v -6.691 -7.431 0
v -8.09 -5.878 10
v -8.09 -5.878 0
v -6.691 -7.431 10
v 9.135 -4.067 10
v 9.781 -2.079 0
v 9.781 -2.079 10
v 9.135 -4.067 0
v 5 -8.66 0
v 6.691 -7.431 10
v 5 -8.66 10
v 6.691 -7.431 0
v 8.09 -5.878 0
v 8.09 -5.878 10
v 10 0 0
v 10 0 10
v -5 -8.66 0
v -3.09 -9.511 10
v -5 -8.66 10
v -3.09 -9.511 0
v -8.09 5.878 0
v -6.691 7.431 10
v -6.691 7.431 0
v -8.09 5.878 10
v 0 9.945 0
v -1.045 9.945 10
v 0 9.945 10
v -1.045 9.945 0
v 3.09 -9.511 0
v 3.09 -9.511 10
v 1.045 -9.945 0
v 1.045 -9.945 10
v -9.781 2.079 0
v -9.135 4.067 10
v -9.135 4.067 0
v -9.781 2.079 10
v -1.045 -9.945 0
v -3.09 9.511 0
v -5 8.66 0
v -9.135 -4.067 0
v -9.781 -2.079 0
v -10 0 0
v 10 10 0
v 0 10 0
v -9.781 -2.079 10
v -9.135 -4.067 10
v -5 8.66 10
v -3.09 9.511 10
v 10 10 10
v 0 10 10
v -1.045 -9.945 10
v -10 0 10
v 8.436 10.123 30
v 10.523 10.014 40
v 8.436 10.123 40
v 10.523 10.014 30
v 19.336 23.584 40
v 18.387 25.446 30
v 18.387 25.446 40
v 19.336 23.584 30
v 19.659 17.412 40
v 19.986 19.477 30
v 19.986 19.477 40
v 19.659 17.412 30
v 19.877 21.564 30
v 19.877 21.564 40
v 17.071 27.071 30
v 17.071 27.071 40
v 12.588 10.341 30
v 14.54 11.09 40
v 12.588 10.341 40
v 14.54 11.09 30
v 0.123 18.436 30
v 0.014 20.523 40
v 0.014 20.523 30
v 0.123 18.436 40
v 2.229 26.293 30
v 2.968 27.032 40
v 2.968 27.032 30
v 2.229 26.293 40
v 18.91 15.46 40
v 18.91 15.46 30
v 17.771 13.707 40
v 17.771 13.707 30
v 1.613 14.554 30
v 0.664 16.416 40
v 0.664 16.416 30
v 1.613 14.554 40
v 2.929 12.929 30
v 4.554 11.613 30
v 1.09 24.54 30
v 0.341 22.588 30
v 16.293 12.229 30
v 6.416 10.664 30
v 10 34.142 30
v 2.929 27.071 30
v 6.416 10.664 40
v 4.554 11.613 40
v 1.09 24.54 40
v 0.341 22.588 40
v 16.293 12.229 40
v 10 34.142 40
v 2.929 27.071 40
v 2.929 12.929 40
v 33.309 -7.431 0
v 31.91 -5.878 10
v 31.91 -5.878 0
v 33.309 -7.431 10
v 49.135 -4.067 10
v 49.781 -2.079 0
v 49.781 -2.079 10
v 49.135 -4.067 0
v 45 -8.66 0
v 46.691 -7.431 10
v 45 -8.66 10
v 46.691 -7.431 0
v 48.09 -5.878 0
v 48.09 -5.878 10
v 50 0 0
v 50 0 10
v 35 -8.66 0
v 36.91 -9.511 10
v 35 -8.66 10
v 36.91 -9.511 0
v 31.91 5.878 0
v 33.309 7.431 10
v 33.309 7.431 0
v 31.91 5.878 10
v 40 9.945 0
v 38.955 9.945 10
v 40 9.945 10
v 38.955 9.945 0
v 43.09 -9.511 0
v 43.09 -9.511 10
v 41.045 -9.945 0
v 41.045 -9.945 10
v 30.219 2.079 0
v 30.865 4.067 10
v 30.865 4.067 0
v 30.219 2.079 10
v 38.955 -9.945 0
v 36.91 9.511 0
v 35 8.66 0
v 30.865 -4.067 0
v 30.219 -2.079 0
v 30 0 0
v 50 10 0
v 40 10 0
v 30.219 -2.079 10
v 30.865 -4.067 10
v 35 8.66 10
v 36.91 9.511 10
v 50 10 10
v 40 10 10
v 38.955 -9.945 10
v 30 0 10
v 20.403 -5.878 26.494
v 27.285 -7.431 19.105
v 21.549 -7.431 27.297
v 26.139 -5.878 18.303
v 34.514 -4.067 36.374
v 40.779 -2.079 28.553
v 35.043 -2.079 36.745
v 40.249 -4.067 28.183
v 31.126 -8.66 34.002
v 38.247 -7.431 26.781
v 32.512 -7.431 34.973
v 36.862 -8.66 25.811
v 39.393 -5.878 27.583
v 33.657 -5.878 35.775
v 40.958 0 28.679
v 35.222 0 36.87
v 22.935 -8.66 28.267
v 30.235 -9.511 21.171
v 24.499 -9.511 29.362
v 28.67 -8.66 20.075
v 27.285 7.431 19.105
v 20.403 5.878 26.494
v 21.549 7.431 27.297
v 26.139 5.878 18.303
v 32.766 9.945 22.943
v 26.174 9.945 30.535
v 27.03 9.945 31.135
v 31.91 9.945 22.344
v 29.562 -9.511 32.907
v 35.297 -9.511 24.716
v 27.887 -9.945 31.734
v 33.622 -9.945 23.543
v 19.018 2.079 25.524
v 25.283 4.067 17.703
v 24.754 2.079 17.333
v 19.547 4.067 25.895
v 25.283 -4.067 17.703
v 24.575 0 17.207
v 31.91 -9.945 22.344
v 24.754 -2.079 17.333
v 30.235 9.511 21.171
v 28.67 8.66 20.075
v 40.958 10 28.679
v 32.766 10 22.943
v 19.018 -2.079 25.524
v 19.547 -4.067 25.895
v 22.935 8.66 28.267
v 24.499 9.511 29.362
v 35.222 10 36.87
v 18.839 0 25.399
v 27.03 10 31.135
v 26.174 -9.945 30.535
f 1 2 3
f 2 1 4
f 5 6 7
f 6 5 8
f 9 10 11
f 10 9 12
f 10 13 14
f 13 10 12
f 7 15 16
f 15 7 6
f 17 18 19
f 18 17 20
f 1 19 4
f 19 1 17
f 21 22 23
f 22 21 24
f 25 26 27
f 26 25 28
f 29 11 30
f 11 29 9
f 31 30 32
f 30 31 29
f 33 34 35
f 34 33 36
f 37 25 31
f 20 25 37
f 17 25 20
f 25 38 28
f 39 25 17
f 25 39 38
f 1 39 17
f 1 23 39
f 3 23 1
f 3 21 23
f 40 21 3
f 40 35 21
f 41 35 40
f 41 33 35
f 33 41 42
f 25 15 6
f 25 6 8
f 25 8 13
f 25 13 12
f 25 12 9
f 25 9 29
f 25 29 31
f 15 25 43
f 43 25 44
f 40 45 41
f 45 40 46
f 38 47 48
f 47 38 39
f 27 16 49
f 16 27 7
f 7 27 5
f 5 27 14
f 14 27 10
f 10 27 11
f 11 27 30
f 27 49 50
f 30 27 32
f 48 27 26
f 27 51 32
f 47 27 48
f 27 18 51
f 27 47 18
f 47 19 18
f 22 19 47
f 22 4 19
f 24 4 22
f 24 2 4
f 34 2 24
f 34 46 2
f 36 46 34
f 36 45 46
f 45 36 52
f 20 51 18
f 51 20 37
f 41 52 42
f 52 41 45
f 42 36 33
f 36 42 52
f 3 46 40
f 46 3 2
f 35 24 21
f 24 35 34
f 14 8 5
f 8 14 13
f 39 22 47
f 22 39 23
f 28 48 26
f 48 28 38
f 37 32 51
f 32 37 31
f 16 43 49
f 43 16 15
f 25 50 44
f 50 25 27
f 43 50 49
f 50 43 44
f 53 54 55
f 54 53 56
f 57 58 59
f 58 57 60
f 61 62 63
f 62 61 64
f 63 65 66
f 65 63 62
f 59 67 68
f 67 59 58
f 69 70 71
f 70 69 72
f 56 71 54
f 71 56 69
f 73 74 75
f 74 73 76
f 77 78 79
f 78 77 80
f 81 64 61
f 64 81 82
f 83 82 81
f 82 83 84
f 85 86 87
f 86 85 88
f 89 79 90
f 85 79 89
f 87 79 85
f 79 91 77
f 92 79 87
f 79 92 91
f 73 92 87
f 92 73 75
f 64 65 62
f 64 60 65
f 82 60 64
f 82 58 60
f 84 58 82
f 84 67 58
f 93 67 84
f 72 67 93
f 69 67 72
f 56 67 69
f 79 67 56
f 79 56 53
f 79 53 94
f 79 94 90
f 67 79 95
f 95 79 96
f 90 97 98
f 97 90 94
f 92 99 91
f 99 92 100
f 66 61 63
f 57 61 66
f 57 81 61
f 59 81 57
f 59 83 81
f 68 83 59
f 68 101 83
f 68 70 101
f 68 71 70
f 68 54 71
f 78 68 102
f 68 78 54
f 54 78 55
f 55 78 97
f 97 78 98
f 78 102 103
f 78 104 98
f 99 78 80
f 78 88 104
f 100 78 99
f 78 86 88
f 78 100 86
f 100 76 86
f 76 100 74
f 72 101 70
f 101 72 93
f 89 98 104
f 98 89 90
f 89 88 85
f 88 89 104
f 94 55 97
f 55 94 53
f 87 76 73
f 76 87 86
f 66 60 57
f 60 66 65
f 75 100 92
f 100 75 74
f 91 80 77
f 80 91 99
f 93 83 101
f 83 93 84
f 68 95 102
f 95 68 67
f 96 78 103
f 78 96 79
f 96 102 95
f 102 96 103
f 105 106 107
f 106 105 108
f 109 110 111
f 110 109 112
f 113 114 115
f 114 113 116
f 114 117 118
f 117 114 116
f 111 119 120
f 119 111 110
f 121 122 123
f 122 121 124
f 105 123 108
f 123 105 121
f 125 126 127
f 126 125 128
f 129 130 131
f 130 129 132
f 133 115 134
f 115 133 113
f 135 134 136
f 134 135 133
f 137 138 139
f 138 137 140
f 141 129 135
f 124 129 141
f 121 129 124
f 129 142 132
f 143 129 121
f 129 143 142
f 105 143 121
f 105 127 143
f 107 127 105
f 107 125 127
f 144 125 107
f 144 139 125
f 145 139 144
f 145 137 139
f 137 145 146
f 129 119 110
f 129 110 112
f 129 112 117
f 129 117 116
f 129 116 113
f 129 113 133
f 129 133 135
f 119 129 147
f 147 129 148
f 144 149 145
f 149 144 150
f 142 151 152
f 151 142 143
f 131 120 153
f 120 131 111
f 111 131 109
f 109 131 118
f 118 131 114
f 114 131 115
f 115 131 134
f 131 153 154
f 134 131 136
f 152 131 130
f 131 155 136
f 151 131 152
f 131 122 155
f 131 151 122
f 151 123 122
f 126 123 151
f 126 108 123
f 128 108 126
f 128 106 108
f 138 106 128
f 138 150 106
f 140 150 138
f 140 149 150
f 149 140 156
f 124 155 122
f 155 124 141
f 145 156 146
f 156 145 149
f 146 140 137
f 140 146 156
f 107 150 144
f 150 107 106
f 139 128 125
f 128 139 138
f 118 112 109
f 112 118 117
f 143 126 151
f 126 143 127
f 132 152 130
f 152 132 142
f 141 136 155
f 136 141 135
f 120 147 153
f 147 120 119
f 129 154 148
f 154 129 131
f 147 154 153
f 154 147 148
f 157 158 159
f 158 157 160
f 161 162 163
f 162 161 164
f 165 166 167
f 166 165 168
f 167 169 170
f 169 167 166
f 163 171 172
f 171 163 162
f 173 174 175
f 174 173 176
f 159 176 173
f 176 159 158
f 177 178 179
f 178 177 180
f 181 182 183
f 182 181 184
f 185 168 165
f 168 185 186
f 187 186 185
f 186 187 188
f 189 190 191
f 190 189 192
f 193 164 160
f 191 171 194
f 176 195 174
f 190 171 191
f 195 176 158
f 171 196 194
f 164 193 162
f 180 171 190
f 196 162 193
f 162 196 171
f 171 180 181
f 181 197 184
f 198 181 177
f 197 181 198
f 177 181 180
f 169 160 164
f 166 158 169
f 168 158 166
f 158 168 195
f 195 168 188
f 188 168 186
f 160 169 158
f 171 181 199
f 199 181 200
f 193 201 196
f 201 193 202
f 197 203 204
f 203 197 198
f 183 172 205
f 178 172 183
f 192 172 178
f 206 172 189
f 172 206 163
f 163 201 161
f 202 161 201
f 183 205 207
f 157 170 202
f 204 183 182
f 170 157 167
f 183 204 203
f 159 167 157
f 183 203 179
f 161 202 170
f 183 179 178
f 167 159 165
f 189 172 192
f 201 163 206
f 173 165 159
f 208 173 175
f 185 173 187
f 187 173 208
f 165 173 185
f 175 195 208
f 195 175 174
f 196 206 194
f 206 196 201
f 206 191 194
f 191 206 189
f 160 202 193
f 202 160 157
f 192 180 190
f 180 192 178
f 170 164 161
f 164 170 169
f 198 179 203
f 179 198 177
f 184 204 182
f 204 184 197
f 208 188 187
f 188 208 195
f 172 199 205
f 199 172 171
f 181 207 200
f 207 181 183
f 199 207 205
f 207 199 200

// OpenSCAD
build();

module build(args) 
{
    // echo(c = color("aqua"));
     color("violet") example1() ;
     example2() ;
}

module obj()
{
    union()
    {
        cylinder(r=10.0,h=10,center=false);
        cube(size=[10,10,10],center=false); 
    }   
}

/*
multmatrix
Multiplies the geometry of all child elements with the given affine transformation matrix, 
where the matrix is 4×3 - a vector of 3 row vectors with 4 elements each, 
or a 4×4 matrix with the 4th row always forced to [0,0,0,1].

Usage: multmatrix(m = [...]) { ... }

This is a breakdown of what you can do with the independent elements in the matrix (for the first three rows):
[Scale X]	[Shear X along Y]	[Shear X along Z]	[Translate X]
[Shear Y along X]	[Scale Y]	[Shear Y along Z]	[Translate Y]
[Shear Z along X]	[Shear Z along Y]	[Scale Z]	[Translate Z]
The fourth row is forced to [0,0,0,1] and can be omitted unless you are combining matrices before passing to multmatrix, 
as it is not processed in OpenSCAD. Each matrix operates on the points of the given geometry as 
if each vertex is a 4 element vector consisting of a 3D vector with an implicit 1 as its 4th element, 
such as v=[x, y, z, 1]. The role of the implicit fourth row of m is to preserve the implicit 1 in the 
4th element of the vectors, permitting the translations to work. The operation of multmatrix therefore 
performs m*v for each vertex v. Any elements (other than the 4th row) not specified in m are treated as zeros.

This example rotates by 45 degrees in the XY plane and translates by [10,20,30], 
i.e. the same as translate([10,20,30]) rotate([0,0,45]) would do.
*/
module example1() 
{
    angle=45;
    multmatrix
        (
            m = [ [cos(angle), -sin(angle), 0, 10],
                 [sin(angle),  cos(angle), 0, 20],
                 [         0,           0, 1, 30],
                 [         0,           0, 0,  1]
                ]
        ) 
    obj();
}

/*
The following example demonstrates combining affine transformation matrices by matrix multiplication, 
producing in the final version a transformation equivalent to rotate([0, -35, 0]) translate([40, 0, 0]) Obj();. 
Note that the signs on the sin function appear to be in a different order than the above example, 
because the positive one must be ordered as x into y, y into z, z into x for the rotation angles to correspond to 
rotation about the other axis in a right-handed coordinate system.
*/
module example2() 
{
    y_ang=-35;
    mrot_y = 
        [ 
            [ cos(y_ang), 0,  sin(y_ang), 0],
            [         0,  1,           0, 0],
            [-sin(y_ang), 0,  cos(y_ang), 0],
            [         0,  0,           0, 1]
        ];
    mtrans_x = 
        [ 
            [1, 0, 0, 40],
            [0, 1, 0,  0],
            [0, 0, 1,  0],
            [0, 0, 0,  1]
        ];
    
    echo(example2 = mrot_y*mtrans_x);

    color("grey") obj();
    color("aqua") multmatrix(mtrans_x) obj();
    color("SteelBlue") multmatrix(mrot_y * mtrans_x) obj();
}
